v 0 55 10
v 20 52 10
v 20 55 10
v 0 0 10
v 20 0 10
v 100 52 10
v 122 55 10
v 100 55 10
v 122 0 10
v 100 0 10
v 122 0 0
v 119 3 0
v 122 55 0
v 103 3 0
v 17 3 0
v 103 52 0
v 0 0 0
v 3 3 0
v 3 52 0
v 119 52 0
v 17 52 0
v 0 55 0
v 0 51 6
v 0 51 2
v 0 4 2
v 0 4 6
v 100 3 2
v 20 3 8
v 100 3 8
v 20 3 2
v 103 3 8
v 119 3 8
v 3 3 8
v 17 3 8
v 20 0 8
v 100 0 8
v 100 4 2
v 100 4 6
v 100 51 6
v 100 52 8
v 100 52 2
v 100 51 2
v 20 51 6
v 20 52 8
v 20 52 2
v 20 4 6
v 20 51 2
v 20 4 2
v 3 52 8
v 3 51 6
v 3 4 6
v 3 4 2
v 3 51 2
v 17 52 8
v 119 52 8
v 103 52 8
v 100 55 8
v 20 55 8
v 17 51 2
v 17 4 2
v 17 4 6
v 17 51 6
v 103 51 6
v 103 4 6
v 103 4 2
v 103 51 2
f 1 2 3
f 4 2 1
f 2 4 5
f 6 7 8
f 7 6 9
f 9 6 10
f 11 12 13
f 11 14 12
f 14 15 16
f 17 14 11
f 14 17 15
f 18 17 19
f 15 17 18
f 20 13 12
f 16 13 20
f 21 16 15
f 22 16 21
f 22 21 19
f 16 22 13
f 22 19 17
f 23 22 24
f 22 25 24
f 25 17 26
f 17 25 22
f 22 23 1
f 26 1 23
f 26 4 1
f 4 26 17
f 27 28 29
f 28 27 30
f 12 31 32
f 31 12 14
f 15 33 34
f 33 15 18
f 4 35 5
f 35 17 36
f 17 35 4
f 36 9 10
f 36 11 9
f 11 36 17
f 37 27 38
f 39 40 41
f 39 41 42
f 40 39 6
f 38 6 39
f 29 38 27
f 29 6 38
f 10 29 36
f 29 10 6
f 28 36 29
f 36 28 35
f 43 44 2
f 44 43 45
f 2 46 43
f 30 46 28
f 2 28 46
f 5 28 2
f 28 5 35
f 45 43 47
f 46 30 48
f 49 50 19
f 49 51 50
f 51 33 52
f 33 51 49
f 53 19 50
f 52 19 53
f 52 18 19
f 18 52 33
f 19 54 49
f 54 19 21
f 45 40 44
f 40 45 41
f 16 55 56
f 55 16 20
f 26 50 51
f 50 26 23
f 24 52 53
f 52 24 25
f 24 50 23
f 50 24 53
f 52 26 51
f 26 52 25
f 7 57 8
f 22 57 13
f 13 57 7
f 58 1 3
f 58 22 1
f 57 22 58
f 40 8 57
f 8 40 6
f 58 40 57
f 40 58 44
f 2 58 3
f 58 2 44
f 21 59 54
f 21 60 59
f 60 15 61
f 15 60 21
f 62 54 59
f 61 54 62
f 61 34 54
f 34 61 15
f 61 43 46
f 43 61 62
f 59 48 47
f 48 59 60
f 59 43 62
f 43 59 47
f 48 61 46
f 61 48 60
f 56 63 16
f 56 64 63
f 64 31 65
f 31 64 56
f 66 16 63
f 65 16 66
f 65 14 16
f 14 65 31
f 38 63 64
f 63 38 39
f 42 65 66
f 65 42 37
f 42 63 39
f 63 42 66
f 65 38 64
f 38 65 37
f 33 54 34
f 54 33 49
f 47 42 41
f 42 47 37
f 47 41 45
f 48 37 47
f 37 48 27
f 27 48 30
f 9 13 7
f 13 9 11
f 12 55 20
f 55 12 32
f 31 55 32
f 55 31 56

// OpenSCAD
difference () {
cube ([120,3,10]);
translate ([20,0,8])
cube ([80,4,4]);
}
difference () {
cube ([3,52,10]); // horizontal bar 1
translate ([0,4,2])
cube ([3,47,4]);
}
translate ([0,0,8])
cube ([20,52,2]);
translate ([20,0,0])
cube ([80,52,2]);

difference () {
translate ([0,52,0])
cube ([120,3,10]);
translate ([20,52,8])
cube ([80,4,4]);
}

translate ([119,0,0])
cube ([3,55,10]); // end horizontal bar
translate ([102,0,8])
cube ([20,52,2]);
difference () {
translate ([17,0,0])
cube ([3,52,10]); // horizontal bar 2
translate ([17,4,2])
cube ([3,47,4]);
}
difference () {
translate ([100,0,0])
cube ([3,52,10]); // horizontal bar 3
translate ([100,4,2])
cube ([3,47,4]);
}
